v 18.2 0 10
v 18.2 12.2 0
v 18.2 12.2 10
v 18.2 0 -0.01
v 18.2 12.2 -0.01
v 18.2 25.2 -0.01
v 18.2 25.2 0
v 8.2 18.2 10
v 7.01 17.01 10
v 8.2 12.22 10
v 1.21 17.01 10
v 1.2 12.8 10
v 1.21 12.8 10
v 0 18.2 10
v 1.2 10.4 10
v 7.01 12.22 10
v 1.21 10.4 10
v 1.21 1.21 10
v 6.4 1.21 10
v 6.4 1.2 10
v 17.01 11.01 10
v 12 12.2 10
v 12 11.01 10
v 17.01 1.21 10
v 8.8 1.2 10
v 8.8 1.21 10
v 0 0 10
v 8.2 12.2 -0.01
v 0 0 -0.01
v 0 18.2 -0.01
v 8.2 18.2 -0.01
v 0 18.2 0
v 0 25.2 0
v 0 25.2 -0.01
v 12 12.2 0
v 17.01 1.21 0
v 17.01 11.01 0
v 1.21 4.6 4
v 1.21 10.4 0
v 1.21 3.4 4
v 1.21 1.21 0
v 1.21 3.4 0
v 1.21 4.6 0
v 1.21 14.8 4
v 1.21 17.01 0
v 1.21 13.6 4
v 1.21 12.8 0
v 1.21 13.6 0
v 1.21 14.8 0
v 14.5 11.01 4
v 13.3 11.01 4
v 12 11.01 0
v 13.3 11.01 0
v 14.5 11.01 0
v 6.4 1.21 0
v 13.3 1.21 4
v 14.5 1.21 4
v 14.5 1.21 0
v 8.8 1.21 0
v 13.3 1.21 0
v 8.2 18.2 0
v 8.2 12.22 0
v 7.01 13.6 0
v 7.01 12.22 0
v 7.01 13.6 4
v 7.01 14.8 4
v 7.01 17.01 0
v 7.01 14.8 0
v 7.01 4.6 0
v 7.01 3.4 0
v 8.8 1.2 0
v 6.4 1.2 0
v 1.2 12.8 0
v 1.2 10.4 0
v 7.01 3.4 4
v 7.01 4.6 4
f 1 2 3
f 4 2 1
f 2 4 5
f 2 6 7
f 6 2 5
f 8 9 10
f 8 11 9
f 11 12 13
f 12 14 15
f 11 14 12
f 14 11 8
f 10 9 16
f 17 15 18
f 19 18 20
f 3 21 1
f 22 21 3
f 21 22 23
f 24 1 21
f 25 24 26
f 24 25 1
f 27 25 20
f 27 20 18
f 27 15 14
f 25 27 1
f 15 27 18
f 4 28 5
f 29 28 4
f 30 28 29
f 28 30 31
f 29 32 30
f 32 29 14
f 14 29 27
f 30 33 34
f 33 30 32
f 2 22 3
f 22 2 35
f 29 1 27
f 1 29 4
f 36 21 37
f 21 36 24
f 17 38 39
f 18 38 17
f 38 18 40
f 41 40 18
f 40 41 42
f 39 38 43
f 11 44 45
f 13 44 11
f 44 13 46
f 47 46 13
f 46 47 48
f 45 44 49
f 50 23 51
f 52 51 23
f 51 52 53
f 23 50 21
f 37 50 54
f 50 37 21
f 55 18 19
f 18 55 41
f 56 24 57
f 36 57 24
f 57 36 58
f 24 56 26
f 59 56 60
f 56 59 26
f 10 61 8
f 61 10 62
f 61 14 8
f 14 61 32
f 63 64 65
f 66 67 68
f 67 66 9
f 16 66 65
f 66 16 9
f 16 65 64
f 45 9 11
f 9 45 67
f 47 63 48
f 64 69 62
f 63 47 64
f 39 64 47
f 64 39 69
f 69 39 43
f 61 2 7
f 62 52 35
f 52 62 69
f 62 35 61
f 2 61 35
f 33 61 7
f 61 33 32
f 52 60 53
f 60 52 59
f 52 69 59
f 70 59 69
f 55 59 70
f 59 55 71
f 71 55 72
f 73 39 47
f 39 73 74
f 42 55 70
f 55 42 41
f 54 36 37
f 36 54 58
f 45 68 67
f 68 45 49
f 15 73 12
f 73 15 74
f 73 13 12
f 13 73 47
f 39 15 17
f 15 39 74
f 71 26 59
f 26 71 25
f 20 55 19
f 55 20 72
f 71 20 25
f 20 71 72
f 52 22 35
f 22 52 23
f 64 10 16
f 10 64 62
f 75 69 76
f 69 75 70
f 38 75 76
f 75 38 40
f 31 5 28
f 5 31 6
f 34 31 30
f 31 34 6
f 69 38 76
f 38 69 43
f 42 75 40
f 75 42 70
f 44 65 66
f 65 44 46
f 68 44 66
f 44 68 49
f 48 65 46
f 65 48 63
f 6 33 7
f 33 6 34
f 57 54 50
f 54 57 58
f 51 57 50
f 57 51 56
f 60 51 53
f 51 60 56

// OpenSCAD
// file: ../Base/Rotation.scad
// Fischertechnik Box Foundation
// Geometry Helpers Rotation

include <PlacementOptions.scad>

// getRotatedSpace(space, rotation=NoRotation)
// Rotates the space dependent on the specified rotation

function getRotatedSpace(space, rotation=NoRotation) = [
    (rotation == Rotate90 || rotation == Rotate270) ? space.y : space.x,
    (rotation == Rotate90 || rotation == Rotate270) ? space.x : space.y
];

// Rotates the given space around the fixed left lower corner
// space = the space the children needs as width/depth list [width,depth]
// rotation = 0 Rotate0 degrees, 1 Rotate90 degrees, 2 Rotate180 degrees, 3 Rotate270 degrees (equivalent to -90)

module RotateFix(space, rotation=NoRotation) {
    dy = (rotation == Rotate0 || rotation == Rotate270) ? 0 :
        (rotation == Rotate90) ? space.x :
        space.y;
    dx = (rotation < Rotate180) ? 0 :
        (rotation == Rotate180) ? space.x :
        space.y;
    
    translate([dx, dy, 0])
        rotate([0, 0, rotations[rotation]])
            children();
}
// file: ../Base/Alignment.scad
// Fischertechnik Box Foundation
// Geometry Helpers Alignment

include <PlacementOptions.scad>

// getAlignedX(elementWidth, spaceWidth, align=AlignRight, offset=0)
// Gets the aligned X offset of an element with the given
// width in the given space.
// elementWidth = The width of the element to positon
// spaceWidth = The space where the element should be aligned
// align = 0 AlignLeft, 1 AlignCenter, 2 AlignRight
// offset = an optional offset from the aligned position. When
// aligned left or centered, then positive values are in X direction.
// When aligned right then positive values are in negative X direction.

function getAlignedX(elementWidth, spaceWidth, align=AlignRight, offset=0) =
    (align == AlignLeft) ?
        offset :
        ((align == AlignCenter) ?
        (spaceWidth - elementWidth)/2 + offset :
        spaceWidth - offset - elementWidth);

// getAlignedY(elementDepth, spaceDepth, align=AlignTop, offset=0)
// Gets the aligned Y offset of an element with the given
// depth in the given space.
// elementDepth = The depth of the element to positon
// spaceDepth = The space where the element should be aligned
// align = 0 AlignBottom, 1 AlignCenter, 2 AlignTop
// offset = an optional offset from the aligned position. When
// aligned bottom or centered, then positive values are in Y direction.
// When aligned top then positive values are in negative Y direction.

function getAlignedY(elementDepth, spaceDepth, align=AlignTop, offset=0) =
    (align == AlignBottom) ?
        offset :
        ((align == AlignCenter) ?
        (spaceDepth - elementDepth)/2 + offset :
        spaceDepth - offset - elementDepth);
// file: ../Base/PlacementOptions.scad
// Fischertechnik Box Foundation
// Placement Options

// Alignment
NoAlign = 0;
AlignLeft = 1;
AlignBottom = 2;
AlignCenter = 3;
AlignRight = 4;
AlignTop = 5;

// Element rotation degree steps
rotations = [0, -90, -180, -270];

// Rotation
NoRotation = 0;
Rotate0 = 0;
Rotate90 = 1;
Rotate180 = 2;
Rotate270 = 3;

// Docking (seen from above)
NoDock = -1;
DockLeft = 0;
DockTop = 1;
DockRight = 2;
DockCorner = 2;
DockBottom = 3;

// Web corners
LowerLeft = 0;
UpperLeft = 1;
UpperRight = 2;
LowerRight = 3;

// Web position relative to corner
LeftOfCorner = 0;
RightOfCorner = 1;
// file: ../Base/Boxes.scad
// Fischertechnik Box Foundation
// Pre-designed Boxes

use <Constants.scad>

include <PlacementOptions.scad>

box190Width = 190;
box190Depth = 130;
box130Width = 130;
box130Depth = 95;

// Values are from an original ec3 box
topBottomDifference = 1.5;
outerHeight = 40;
baseThickness = 1.8;
innerHeight = outerHeight - baseThickness;
stackExcess = 5.7;
radius = 3.5;
wallThickness = 1.5;
tolerance = 0.2;

boxWallThickness = wallThickness;
boxBaseThickness = baseThickness;
boxWebWidth = 3.0;

// getBoxWallThickness()
// Gets the wall thickness of a Fischertechnik Box
function getBoxWallThickness() = boxWallThickness;

// getBoxUsageHeight(height = 38.2)
// Gets the usable height of a Fischertechnik box
// height = Outer height of the box from the bottom to the upper edge.
function getBoxUsageHeight(height = outerHeight) = height - baseThickness - stackExcess;

// getBoxInnerHeight()
// Gets the inner height of a Fischertechnik box, including the stack excess
function getBoxInnerHeight() = innerHeight;

// getBoxBaseThickness()
// Gets the thickness of the Fischertechnik box base.
function getBoxBaseThickness() = boxBaseThickness;

// getBoxWebWidth()
// Gets the width of a box web
function getBoxWebWidth() = boxWebWidth;

// getBox190Space()
// Gets the usable inner space of a Box 190 as an x/y-list
function getBox190Space() = [
    box190Width - 2*getBoxWallThickness() - topBottomDifference, 
    box190Depth - 2*getBoxWallThickness() - topBottomDifference ];

// RoundedCornerPlate(width, depth, height, radius)
// Creates a body plate with rounded corners for a box. Used
// also to create the complete box with the hull module.
// width = Width of the plate
// depth = depth of the plate 
// height = thickness of the plate
// radius = radius of the rounded corner
module RoundedCornerPlate(width, depth, height, radius) {
    translate([radius, radius])
    hull() {
        w = width-2*radius;
        d = depth-2*radius;
        cube([w, d, height]);
        cylinder(height, r=radius, $fn=getFragments());
        translate([w, 0])
            cylinder(height, r=radius, $fn=getFragments());
        translate([w, d])
            cylinder(height, r=radius, $fn=getFragments());
        translate([0, d])
            cylinder(height, r=radius, $fn=getFragments());
    }
}

// BoxBase(width, depth)
// Creates an empty stackable Fischertechnik compatible box
// width = Outer width of the box (190, 130, ...)
// depth = Outer depth of the box (130, 95, ...)

module BoxBase(width, depth, height=outerHeight) {    
    thinPlate = 0.01;

    innerHeight = height - baseThickness;    
    
    module Body(tolerance=tolerance) {
        hull() {
            // Bottom with tolerance to fit into the original boxes when stacked
            translate([-wallThickness+tolerance, -wallThickness+tolerance, -baseThickness])
                RoundedCornerPlate(width-topBottomDifference-2*tolerance, depth-topBottomDifference-2*tolerance, thinPlate, radius);
            
            // Top
            translate([-wallThickness-topBottomDifference/2, -wallThickness-topBottomDifference/2, innerHeight-thinPlate])
                RoundedCornerPlate(width, depth, thinPlate, radius);
         }
    }

    module Cutoff() {
        hull() {
            coWidth = width - 2*wallThickness;
            coDepth = depth - 2*wallThickness;
            
            // Bottom
            RoundedCornerPlate(coWidth-topBottomDifference, coDepth-topBottomDifference, thinPlate, radius);

            // Top
            translate([-topBottomDifference/2, -topBottomDifference/2, innerHeight+thinPlate]) 
                RoundedCornerPlate(coWidth, coDepth, thinPlate, radius);
        }
    }
    
    difference() {        
        Body();
        Cutoff();
        stackOffset = innerHeight - stackExcess;
        translate([0, 0, stackOffset + baseThickness])
            Body(tolerance=0);
    }
}

// Creates the Fischertechnik empty box 130x190 mm and places it at position 0,0
// 190x130 are the outer sizes, the inner space is slightly smaller. Use getBox190Space() to get the inner sizes.
// The box is positioned that the usable inner space is at the 0,0,0 position.

module Box190() {
    BoxBase(box190Width, box190Depth);
}

// Gets the usable inner space of a Box 130 as an x/y-list
function getBox130Space() = [
    box130Width - 2*getBoxWallThickness() - topBottomDifference, 
    box130Depth - 2*getBoxWallThickness() - topBottomDifference ];

// Creates the Fischertechnik empty box 95x130 mm and places it at position 0,0
// 190x130 are the outer sizes, the inner space is slightly smaller. Use getBox190Space() to get the inner sizes.
// The box is positioned that the usable inner space is at the 0,0,0 position.

module Box130() {
    BoxBase(box130Width, box130Depth);
}

// Creates a web at the specified box walls
// corner 0 = LowerLeft, 1 = UpperLeft, 2 = UpperRight, 3 = LowerRight
// side 0 = LeftOfCorner, 1 = RightOfCorner
// distance = Distance in mm from the corner
// boxSpace = inner width and depth of the box (default: Box 190)
// webWidth = length of the web (default is 3 mms)
// webThickness = thickness of the web (default is 1 mm)
// height = Height of the web (standard is getBoxUsageHeight())

module BoxWeb(corner, side, distance, boxSpace=getBox190Space(), webWidth=getBoxWebWidth(), webThickness=1.0, height=getBoxUsageHeight()) {
    sink = getBoxWallThickness()/2;

    width = (corner % 2 == 0) ? 
            (side == LeftOfCorner ? webWidth : webThickness) :
            (side == LeftOfCorner ? webThickness : webWidth);

    depth = (corner % 2 == 0) ? 
            (side == RightOfCorner ? webWidth : webThickness) :
            (side == RightOfCorner ? webThickness : webWidth);
    
    xDiff = corner == LowerLeft ? 
                (side == LeftOfCorner ? -sink : distance) :
            (corner == UpperLeft ?                
                (side == LeftOfCorner ? distance : -sink) :
            (corner == UpperRight ?
                (side == LeftOfCorner ? boxSpace.x-webWidth+sink : boxSpace.x-distance-webThickness) :
                (side == LeftOfCorner ? boxSpace.x-distance-webThickness: boxSpace.x-webWidth+sink)));

    yDiff = corner == LowerLeft ? 
                (side == RightOfCorner ? -sink : distance) :
            (corner == UpperLeft ?
                (side == RightOfCorner ? boxSpace.y-distance-webThickness : boxSpace.y-webWidth+sink) :
            (corner == UpperRight ?
                (side == RightOfCorner ? boxSpace.y-webWidth+sink : boxSpace.y-distance-webThickness) :
                (side == RightOfCorner ? distance : -sink)));
    
    translate([xDiff, yDiff, -getExcess()])
        cube([width, depth, height + 2*getExcess()]);
}
// file: ../Base/Placement.scad
// Fischertechnik Box Foundation
// Geometry Helpers Placement

use <Constants.scad>
use <Alignment.scad>
use <Rotation.scad>
use <Boxes.scad>

include <PlacementOptions.scad>

// Place(x=0, y=0, elementSpace=[0,0], alignX=AlignLeft, alignY=AlignBottom, rotation=Rotate0, boxSpace=getBox190Space())
// Places the child at the specified position
// y = Y-Position. This is a relative position when an X aligment is specified.
// x = X-Position. This is a relative position when an Y aligment is specified.
// elementSpace = space of the element to be placed [x,y]
// alignX = -1=NoAlign, 0 AlignLeft, 1 AlignCenter, 3 AlignRight (elementSpace and boxSpace required!)
// alignY = -1=NoAlign, 2 AlignBottom, 1 AlignCenter, 4 AlignTop (elementSpace and boxSpace required!)
// rotation = 0 Rotate0 0 degrees, 1 Rotate90 90 degrees, 
// 2 Rotate180 180 degrees, 3 Rotate270 270 degrees (equivalent to -90)
// boxSpace = Inner space of the box where the placement occurs [x,y] - default is Box 190x130 inner space

module Place(x=0, y=0, elementSpace=[0,0], 
  alignX=AlignLeft, alignY=AlignBottom, 
  rotation=NoRotation, boxSpace=getBox190Space()) {

    module Position(x, y, space, rotation=Rotate0) {
        translate([x, y, 0])
            RotateFix(space, rotation)
                children();
    }

    space = getRotatedSpace(elementSpace, rotation);
    alignedX = getAlignedX(space.x, boxSpace.x, alignX, x);
    alignedY = getAlignedY(space.y, boxSpace.y, alignY, y);
    Position(alignedX, alignedY, elementSpace, rotation)
        children();
}

// Center(space=getBox130Space(), elementSpace=[0,0])
// space = Space where the children is centered. For cylinder use centered=true and no elementSpace.
// elementSpace = space of the element to be centered [x,y]

module Center(space=getBox190Space(), elementSpace=[0,0]) {
    Place(elementSpace=elementSpace, boxSpace=space, alignX=AlignCenter, alignY=AlignCenter)
        children();
}

// CenterHorizontal(width=0, y=0, offset=0, space=getBox130Space())
// width = Width of the element to be placed.
// y = Y position of the element
// offset = Offset from the center position (negative will be left of the center)
// space = Space where the element is placed

module CenterHorizontal(width=0, y=0, offset=0, space=getBox190Space()) {
    Place(x=offset, y=y, elementSpace=[width, 0], boxSpace=space, alignX=AlignCenter)
        children(0);
}

// CenterVertical(depth=0, x=0, offset=0, space=getBox130Space())
// depth = Depth of the element to be placed.
// x = X position of the element
// offset = Offset from the center position (negative will be down of the center)
// space = Space where the element is placed

module CenterVertical(depth=0, x=0, offset=0, space=getBox190Space()) {
    Place(x=x, y=offset, elementSpace=[0, depth], boxSpace=space, alignY=AlignCenter)
        children(0);
}

// getIsVertical(align)
// True if the specified alignment needs a vertical orientation for a divider (AlignRight, AlignLeft)

function getIsVertical(align) = (align == AlignRight || align == AlignLeft);

// getIsHorizontal(align)
// True if the specified alignment needs a horizontal orientation for a divider (AlignTop, AlignBottom)

function getIsHorizontal(align) = (align == AlignTop || align == AlignBottom);
// file: ../Base/Constants.scad
// Fischertechnik Box Foundation
// Constants

// Constant values necessary for multiple elements

// Base constants
dividerThickness = 1.2;
excess = 0.01;
fragments = 90;
tolerance = 0.8;

// Gets the thickness of a divider 
function getDividerThickness() = dividerThickness;

// Gets the excess that is used to merge walls into each other
function getExcess() = excess;

// Gets amount of fragments of a cylinder
function getFragments() = fragments;

// Gets the inner tolerance of a frame to each side
function getTolerance() = tolerance;


// Fischertechnik specific constants
axisDiameter = 4;
axisBottomDiameter = axisDiameter + 1;
axisTolerance = 0.2;

// Gets axis diameter of Fischertechnik axis
function getAxisDiameter() = axisDiameter;

// Gets axis diameter tolerance (subtracted for element axis)
function getAxisTolerance() = axisTolerance;

// Gets the axis diameter for standing axis
function getStandAxisDiameter() = getAxisDiameter() - getAxisTolerance();

// Gets axis bottom diameter for thicker part at the bottom
function getAxisBottomDiameter() = axisBottomDiameter;

pinHeight = 2.5;

// gets the height of a connecting pin
function getPinHeight() = pinHeight;

standardEdgeDistance = 2.5;
standardWebDistance = 11.5;
standardCornerLength = 15;

// gets the standard distance to the wall of the box for dockable frames with webs
function getStandardEdgeDistance() = standardEdgeDistance;

// gets the standard distance of each web to the corner of the dockable frame
function getStandardWebDistance() = standardWebDistance;

// gets the standard length of the corner walls of a dockable frame
function getStandardCornerLength() = standardCornerLength;

tubeWallFactor = 0.8;

// gets the wall thickness of a tube.
function getTubeWallThickness() = tubeWallFactor * getDividerThickness();

smallPartsFrameHeight = 20;

// gets the frame height for docked small parts boxes.
function getSmallPartsFrameHeight() = smallPartsFrameHeight;

hubRingDiameter = 19.5;
hubRingLevelDiameter = 21;

// gets the diameter of a tube matching the inner ring of a wheel
function getHubRingDiameter() = hubRingDiameter;

// gets the diameter of a hub tube with a thicker diameter
function getHubRingLevelDiameter() = hubRingLevelDiameter;
// main file
// Fischertechnik Box Library
// Holder for gear support with worm
// 31069

use <../Base/Constants.scad>
use <../ModelBase/Simple.scad>

width = 15;
depth = 22;
height = 10;

// getHolderGearSupportWithWormSpace()
// Gets the space of a frame for a holder of a gear support with worm (mini-mot 1)

function getHolderGearSupportWithWormSpace() = getFrameOuterVolume([width, depth, height]);

// HolderGearSupportWithWorm()
// holder of a gear support with worm (mini-mot 1)

module HolderGearSupportWithWorm() {
    Space(getHolderGearSupportWithWormSpace());

    width1 = width;
    depth1 = 9;
    width2 = width;
    depth2 = 5;
    difference() {
        AngledFrame(width1, depth1, width2, depth2, height);
        cutoffWidth = 5;
        translate([getDividerThickness() + depth2 + getTolerance() - getExcess(), getDividerThickness() + depth1 + getTolerance() - getExcess()])
            cube([cutoffWidth + getExcess(), getDividerThickness() + 3*getExcess(), height + getExcess()]);
    }
    webHeight = 4;
    hVolume = [depth2 + getTolerance() + 2*getExcess(), getDividerThickness(), webHeight];
    vVolume = [getDividerThickness(), depth1 + getTolerance() + 2*getExcess(), webHeight];
    distance = 9;
    translate([getDividerThickness() - getExcess(), (width + getTolerance() - distance) / 2]) {
        Wall(hVolume);
        translate([0, distance + getDividerThickness()])
            Wall(hVolume);
    }
    rightDistance = 2.5;
    translate([width + getTolerance() - rightDistance, getDividerThickness() - getExcess()])
        Wall(vVolume);
}

// Tests
color("lightgray")
HolderGearSupportWithWorm();
